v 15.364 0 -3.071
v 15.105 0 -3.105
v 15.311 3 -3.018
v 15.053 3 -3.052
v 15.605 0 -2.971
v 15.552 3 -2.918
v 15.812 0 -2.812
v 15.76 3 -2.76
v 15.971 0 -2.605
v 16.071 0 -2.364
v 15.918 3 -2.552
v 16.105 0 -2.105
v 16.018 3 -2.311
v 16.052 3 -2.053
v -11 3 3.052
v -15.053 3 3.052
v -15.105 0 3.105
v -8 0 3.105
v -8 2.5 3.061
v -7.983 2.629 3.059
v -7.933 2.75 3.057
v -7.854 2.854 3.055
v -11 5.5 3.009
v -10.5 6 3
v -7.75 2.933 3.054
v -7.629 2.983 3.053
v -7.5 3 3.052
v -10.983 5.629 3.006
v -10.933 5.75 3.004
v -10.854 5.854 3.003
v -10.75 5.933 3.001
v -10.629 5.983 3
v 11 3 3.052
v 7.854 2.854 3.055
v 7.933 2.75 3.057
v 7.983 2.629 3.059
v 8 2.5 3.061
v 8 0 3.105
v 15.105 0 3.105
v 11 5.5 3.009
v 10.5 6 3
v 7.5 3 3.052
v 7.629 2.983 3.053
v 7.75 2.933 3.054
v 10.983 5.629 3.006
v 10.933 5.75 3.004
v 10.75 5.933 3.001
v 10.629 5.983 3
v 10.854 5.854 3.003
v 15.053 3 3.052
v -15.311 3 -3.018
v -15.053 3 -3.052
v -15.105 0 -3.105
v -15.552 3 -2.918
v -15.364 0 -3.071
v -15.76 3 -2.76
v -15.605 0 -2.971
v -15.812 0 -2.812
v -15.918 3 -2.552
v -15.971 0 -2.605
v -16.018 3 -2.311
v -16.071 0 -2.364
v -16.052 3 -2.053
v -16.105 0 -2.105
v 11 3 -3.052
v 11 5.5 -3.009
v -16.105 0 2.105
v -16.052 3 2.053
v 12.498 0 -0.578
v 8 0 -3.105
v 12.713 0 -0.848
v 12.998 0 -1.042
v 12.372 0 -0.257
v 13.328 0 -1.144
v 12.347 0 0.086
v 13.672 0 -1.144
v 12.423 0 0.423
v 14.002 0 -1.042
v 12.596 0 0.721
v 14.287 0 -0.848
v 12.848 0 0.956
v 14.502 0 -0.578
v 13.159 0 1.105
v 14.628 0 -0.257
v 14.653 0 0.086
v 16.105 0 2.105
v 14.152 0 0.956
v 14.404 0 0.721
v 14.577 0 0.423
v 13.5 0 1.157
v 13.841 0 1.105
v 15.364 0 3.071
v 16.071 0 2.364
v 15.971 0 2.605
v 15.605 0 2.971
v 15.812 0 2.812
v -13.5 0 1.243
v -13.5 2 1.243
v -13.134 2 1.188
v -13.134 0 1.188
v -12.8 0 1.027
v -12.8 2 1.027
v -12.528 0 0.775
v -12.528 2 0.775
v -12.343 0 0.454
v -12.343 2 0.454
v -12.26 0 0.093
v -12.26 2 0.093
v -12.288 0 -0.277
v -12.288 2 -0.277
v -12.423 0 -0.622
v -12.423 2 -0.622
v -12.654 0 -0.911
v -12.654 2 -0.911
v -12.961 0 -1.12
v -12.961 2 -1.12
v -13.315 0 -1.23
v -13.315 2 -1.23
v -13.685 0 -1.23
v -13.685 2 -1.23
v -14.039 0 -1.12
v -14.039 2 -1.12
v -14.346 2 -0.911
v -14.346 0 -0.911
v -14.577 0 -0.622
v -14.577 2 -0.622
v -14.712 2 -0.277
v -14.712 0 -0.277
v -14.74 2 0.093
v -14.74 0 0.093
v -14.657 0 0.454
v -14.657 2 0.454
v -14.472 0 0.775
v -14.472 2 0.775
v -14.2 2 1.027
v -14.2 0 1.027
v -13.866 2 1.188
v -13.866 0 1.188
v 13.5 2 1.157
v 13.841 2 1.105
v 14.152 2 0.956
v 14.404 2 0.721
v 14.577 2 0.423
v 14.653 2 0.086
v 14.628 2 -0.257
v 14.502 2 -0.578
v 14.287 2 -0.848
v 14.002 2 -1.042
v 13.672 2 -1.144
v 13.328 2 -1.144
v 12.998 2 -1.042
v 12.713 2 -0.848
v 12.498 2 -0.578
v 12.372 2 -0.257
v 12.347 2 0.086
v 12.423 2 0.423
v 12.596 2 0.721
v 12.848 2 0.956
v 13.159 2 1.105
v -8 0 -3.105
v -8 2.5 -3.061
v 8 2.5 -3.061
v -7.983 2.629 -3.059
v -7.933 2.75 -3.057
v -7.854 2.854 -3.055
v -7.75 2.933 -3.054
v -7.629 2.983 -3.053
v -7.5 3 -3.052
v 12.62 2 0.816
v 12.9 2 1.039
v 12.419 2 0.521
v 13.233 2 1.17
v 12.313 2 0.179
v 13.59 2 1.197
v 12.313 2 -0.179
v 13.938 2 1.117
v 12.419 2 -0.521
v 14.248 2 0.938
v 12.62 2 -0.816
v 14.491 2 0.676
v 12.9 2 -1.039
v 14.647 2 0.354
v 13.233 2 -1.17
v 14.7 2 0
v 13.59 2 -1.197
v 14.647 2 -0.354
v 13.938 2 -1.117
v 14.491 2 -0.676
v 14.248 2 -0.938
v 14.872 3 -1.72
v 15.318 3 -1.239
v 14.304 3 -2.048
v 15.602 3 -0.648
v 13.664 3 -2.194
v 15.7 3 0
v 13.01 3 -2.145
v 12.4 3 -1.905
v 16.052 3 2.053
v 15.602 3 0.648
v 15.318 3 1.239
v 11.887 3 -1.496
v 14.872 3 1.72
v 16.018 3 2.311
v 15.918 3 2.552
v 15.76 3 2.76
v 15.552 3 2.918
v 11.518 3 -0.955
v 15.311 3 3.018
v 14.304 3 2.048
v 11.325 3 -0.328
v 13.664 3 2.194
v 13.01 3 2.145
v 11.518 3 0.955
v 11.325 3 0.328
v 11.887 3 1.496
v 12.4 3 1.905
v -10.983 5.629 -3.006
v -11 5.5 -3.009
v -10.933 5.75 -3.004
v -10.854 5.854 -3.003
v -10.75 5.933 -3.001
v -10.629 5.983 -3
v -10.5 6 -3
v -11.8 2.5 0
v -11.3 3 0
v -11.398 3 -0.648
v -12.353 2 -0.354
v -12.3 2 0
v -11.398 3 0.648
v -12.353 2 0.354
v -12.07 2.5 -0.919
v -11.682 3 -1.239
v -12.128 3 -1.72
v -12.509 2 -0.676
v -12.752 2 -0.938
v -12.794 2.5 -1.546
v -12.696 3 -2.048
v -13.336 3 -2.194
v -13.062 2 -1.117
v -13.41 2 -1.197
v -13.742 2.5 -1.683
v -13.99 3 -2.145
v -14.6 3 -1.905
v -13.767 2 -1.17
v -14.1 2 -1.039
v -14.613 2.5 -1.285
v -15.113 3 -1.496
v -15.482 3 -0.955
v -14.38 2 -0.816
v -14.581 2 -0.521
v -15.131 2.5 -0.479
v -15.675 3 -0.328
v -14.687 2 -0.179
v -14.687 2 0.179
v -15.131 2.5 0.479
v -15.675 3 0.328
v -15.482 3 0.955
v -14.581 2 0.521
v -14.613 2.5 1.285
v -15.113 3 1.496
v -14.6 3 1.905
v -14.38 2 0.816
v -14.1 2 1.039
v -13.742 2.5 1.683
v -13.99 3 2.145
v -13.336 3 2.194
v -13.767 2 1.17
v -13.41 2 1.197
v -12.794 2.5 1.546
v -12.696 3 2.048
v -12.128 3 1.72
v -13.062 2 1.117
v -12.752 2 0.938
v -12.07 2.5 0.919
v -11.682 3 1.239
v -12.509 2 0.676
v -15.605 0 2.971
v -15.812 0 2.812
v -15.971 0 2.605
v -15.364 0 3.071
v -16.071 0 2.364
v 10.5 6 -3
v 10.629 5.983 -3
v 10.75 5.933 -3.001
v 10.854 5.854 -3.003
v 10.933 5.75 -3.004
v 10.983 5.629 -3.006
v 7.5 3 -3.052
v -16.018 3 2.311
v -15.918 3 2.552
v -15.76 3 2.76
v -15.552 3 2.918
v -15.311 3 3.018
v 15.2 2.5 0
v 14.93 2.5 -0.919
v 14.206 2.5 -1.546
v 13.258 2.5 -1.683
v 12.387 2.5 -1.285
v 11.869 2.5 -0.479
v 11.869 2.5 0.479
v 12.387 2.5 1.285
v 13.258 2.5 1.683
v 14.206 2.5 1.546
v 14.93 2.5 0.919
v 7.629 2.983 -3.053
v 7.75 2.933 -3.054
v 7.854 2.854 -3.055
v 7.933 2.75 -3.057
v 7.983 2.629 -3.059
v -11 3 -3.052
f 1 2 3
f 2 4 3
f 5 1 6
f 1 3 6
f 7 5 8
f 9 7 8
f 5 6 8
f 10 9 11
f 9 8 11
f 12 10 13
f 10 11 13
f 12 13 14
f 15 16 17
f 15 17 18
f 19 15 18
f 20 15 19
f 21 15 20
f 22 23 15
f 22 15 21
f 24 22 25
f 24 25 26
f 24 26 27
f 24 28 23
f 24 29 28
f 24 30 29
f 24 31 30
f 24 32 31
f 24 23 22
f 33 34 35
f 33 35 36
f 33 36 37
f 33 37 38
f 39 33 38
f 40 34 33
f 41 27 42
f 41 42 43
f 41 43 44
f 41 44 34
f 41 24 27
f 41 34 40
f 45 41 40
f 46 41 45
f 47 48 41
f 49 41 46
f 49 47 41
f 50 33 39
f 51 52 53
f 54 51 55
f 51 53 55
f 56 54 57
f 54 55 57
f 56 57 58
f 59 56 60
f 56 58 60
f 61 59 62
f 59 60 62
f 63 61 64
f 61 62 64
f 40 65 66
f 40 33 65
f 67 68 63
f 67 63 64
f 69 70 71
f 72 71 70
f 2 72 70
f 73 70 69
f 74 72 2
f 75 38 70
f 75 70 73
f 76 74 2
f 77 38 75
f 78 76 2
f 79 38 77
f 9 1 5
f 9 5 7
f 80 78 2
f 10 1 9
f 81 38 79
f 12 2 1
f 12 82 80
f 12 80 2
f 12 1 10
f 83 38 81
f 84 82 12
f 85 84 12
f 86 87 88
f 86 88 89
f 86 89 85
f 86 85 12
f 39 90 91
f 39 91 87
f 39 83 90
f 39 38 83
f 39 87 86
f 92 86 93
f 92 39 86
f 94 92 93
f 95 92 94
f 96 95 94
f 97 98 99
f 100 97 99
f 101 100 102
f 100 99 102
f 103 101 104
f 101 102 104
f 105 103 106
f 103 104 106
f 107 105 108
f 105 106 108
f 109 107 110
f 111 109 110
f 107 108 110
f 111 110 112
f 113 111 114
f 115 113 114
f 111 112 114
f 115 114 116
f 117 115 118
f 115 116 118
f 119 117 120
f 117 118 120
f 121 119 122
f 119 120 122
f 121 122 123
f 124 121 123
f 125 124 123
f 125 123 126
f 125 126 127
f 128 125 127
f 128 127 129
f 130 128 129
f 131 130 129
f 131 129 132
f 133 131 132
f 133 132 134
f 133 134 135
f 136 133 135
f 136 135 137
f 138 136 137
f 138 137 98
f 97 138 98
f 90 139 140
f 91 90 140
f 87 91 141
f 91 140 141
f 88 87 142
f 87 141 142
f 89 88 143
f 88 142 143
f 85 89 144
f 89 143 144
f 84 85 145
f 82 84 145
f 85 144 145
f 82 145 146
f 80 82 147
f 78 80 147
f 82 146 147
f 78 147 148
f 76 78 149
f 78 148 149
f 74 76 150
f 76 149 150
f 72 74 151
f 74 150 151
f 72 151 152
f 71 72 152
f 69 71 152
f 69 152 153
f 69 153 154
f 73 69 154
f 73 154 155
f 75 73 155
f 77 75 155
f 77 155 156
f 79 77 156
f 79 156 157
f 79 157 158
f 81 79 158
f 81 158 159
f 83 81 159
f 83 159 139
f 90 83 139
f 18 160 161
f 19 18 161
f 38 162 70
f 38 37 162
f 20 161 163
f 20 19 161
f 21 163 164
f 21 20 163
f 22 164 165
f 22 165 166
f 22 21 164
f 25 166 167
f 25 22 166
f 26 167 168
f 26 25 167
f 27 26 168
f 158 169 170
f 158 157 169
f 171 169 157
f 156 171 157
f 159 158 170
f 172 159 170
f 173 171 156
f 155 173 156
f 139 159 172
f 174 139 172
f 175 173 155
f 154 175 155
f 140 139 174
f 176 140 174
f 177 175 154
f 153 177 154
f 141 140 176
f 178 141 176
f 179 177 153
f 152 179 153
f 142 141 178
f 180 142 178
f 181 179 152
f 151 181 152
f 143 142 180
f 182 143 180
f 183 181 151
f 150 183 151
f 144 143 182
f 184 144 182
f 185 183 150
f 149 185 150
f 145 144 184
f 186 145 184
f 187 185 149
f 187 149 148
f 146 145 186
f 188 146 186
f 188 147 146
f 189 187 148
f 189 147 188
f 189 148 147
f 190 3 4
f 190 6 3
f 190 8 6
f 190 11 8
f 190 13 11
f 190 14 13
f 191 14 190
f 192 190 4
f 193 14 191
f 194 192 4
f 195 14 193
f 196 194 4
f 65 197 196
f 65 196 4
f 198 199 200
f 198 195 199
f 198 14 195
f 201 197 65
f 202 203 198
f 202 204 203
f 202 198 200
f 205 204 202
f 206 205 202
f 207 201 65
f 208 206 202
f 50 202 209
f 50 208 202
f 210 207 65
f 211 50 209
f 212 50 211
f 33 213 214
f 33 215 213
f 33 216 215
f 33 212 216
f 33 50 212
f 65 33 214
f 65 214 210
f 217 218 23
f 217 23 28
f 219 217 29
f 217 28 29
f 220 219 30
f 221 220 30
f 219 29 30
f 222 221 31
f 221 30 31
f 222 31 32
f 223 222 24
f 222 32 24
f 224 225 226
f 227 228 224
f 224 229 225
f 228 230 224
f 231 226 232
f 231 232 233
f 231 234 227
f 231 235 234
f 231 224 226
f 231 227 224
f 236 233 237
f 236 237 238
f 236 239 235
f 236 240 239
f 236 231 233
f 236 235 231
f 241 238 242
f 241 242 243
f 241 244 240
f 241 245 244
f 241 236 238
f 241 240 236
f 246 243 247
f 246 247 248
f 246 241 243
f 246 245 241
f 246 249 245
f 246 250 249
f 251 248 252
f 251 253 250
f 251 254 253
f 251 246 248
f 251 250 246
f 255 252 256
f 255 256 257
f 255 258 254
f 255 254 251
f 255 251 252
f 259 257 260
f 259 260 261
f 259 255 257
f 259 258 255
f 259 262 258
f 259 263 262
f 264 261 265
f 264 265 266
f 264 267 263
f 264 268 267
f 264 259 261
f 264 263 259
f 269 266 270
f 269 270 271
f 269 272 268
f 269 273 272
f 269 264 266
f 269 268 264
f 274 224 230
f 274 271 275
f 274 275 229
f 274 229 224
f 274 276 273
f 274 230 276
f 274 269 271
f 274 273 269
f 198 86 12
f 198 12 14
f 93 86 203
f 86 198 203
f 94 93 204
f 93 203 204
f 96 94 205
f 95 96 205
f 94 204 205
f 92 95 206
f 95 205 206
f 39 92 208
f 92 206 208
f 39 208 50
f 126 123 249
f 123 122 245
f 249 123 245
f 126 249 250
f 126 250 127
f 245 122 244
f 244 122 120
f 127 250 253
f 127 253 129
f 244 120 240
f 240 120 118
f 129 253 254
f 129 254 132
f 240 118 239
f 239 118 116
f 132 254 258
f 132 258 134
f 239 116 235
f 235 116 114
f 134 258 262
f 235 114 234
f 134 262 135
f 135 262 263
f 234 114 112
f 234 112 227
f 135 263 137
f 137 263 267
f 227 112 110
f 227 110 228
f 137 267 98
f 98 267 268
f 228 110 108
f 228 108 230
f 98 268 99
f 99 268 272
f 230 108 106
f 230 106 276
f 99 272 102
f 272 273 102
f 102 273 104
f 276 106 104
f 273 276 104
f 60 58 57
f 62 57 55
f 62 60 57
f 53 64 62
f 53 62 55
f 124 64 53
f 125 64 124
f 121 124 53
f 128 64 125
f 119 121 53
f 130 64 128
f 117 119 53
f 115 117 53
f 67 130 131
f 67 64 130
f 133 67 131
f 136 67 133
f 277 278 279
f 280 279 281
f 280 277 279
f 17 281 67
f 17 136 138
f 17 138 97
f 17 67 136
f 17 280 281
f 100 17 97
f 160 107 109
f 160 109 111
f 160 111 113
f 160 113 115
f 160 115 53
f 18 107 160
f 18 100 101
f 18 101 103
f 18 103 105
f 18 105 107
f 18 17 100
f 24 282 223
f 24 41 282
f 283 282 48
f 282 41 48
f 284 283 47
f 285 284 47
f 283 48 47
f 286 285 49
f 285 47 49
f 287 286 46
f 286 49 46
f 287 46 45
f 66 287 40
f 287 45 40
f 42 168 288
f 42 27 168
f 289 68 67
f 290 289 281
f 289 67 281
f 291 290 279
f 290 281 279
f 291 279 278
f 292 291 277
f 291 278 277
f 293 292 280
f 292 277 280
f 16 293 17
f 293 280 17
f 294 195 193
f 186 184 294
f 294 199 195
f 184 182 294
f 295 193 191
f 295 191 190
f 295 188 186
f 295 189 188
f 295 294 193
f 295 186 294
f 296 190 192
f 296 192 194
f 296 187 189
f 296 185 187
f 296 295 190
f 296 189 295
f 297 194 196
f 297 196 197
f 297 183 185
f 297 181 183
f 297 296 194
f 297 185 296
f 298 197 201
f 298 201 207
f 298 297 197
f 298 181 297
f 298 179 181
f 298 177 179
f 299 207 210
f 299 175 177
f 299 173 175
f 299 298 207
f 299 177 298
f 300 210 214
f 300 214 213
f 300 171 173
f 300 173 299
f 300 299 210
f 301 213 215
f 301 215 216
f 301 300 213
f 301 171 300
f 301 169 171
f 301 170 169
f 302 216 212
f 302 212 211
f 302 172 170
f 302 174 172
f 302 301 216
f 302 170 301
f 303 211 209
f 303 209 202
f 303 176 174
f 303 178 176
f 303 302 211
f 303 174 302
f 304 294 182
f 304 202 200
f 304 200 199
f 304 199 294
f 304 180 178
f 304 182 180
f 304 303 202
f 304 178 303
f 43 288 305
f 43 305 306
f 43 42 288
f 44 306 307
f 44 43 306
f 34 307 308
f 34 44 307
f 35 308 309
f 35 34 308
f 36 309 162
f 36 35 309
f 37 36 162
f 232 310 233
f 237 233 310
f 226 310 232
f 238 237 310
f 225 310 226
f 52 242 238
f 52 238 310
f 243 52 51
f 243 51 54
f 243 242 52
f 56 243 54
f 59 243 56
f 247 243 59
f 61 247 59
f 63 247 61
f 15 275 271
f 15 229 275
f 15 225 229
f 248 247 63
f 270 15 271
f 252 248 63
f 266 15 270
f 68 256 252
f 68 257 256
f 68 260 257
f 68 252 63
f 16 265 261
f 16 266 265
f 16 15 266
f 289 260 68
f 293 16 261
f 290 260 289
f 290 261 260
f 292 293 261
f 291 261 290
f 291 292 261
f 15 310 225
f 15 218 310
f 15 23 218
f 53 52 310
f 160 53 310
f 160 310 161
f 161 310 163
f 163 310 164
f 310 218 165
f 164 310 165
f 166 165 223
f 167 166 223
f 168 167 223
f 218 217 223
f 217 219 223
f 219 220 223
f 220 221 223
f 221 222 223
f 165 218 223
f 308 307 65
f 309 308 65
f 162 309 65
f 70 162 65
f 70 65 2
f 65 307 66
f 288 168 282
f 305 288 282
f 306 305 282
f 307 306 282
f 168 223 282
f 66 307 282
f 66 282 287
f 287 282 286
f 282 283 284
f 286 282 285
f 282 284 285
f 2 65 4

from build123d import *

# Parameters (mm, degrees)
SALIENTE_EXTRUIR1_DEPTH      = 3
TALADROAVANZADO1_OUTLINE_R   = 1.2
TALADROAVANZADO1_DEPTH       = 1
TALADROAVANZADO1_DRAFT       = -45
TALADROAVANZADO1_2_OUTLINE_R = 1.2
TALADROAVANZADO1_2_DEPTH     = 1
TALADROAVANZADO1_2_DRAFT     = -45
CORTAR_EXTRUIR1_REACH        = 18.763
CROQUIS3_R                   = 1.243399974
CROQUIS3_R_2                 = 1.156671482
REDONDEO1_R                  = 0.5
REDONDEO2_R                  = 0.5
NGULO_DE_SALIDA1_ANGLE       = 1
REDONDEO3_R                  = 1


# Read off the part's stored shape, not the designer's step: TaladroAvanzado1
with BuildPart() as part:
    # Croquis1 → Saliente-Extruir1 (new, symmetric)
    with BuildSketch(Plane.XY):
        Polygon((-11, 0), (-8, 0), (-8, 3), (8, 3), (8, 0), (11, 0), (16, 0), (16, 3), (11, 3), (11, 6), (-11, 6), (-11, 3), (-16, 3), (-16, 0), align=None)
    extrude(amount=SALIENTE_EXTRUIR1_DEPTH, both=True)


with BuildPart() as taladroavanzado1_tool:
    # TaladroAvanzado1 outline → TaladroAvanzado1 (with draft: the straight prism first)
    with BuildSketch(Plane(origin=(0, 2, 0), x_dir=(1, 0, 0), z_dir=(0, 1, 0))):
        with Locations((13.5, 0)):
            Circle(TALADROAVANZADO1_OUTLINE_R)
    extrude(amount=TALADROAVANZADO1_DEPTH)
    # TaladroAvanzado1: the draft: its side faces are tilted about the plane it starts from
    taladroavanzado1_sides = [taladroavanzado1_tool.faces().sort_by_distance(p)[0] for p in [
        (12.3, 2.5, 0),
    ]]
    draft(taladroavanzado1_sides, Plane(origin=(0, 2, 0), x_dir=(1, 0, 0), z_dir=(0, 1, 0)), TALADROAVANZADO1_DRAFT)


with BuildPart() as part_1:
    add(part.part)

    # TaladroAvanzado1: cut by taladroavanzado1_tool
    add(taladroavanzado1_tool.part, mode=Mode.SUBTRACT)


with BuildPart() as taladroavanzado1_2_tool:
    # TaladroAvanzado1 2 outline → TaladroAvanzado1 2 (with draft: the straight prism first)
    with BuildSketch(Plane(origin=(0, 2, 0), x_dir=(1, 0, 0), z_dir=(0, 1, 0))):
        with Locations((-13.5, 0)):
            Circle(TALADROAVANZADO1_2_OUTLINE_R)
    extrude(amount=TALADROAVANZADO1_2_DEPTH)
    # TaladroAvanzado1 2: the draft: its side faces are tilted about the plane it starts from
    taladroavanzado1_2_sides = [taladroavanzado1_2_tool.faces().sort_by_distance(p)[0] for p in [
        (-14.7, 2.5, 0),
    ]]
    draft(taladroavanzado1_2_sides, Plane(origin=(0, 2, 0), x_dir=(1, 0, 0), z_dir=(0, 1, 0)), TALADROAVANZADO1_2_DRAFT)


with BuildPart() as part_2:
    add(part_1.part)

    # TaladroAvanzado1 2: cut by taladroavanzado1_2_tool
    add(taladroavanzado1_2_tool.part, mode=Mode.SUBTRACT)

    # Croquis3 → Cortar-Extruir1 (cut, up to next)
    with BuildSketch(Plane(origin=(0, 2, 0), x_dir=(1, 0, 0), z_dir=(0, 1, 0)), mode=Mode.PRIVATE) as cortar_extruir1_sk1:
        with Locations(Location((-13.5, 0, 0), (0, 0, 270))):
            Circle(CROQUIS3_R)
    cortar_extruir1_tool1 = extrude(cortar_extruir1_sk1.sketch, amount=-CORTAR_EXTRUIR1_REACH, mode=Mode.PRIVATE) & part_2.part
    # Croquis3 → Cortar-Extruir1 (cut, up to next)
    with BuildSketch(Plane(origin=(0, 2, 0), x_dir=(1, 0, 0), z_dir=(0, 1, 0)), mode=Mode.PRIVATE) as cortar_extruir1_sk2:
        with Locations(Location((13.5, 0, 0), (0, 0, 270))):
            Circle(CROQUIS3_R_2)
    cortar_extruir1_tool2 = extrude(cortar_extruir1_sk2.sketch, amount=-CORTAR_EXTRUIR1_REACH, mode=Mode.PRIVATE) & part_2.part
    add(cortar_extruir1_tool1.solids().sort_by_distance((-13.5, 2, 0))[0], mode=Mode.SUBTRACT)
    add(cortar_extruir1_tool2.solids().sort_by_distance((13.5, 2, 0))[0], mode=Mode.SUBTRACT)

    # Redondeo1
    redondeo1_edges = [part_2.edges().sort_by_distance(p)[0] for p in [
        (8, 3, 0),
        (-8, 3, 0),
    ]]
    fillet(redondeo1_edges, radius=REDONDEO1_R)

    # Redondeo2
    redondeo2_edges = [part_2.edges().sort_by_distance(p)[0] for p in [
        (-11, 6, 0),
        (11, 6, 0),
    ]]
    fillet(redondeo2_edges, radius=REDONDEO2_R)

    # Ángulo de salida1
    ngulo_de_salida1_faces = [part_2.faces().sort_by_distance(p)[0] for p in [
        (0, 3.234018397, 3),
        (0, 3.234018397, -3),
        (16, 1.5, 0),
        (-16, 1.5, 0),
    ]]
    draft(ngulo_de_salida1_faces, Plane(origin=(11, 6, 3), x_dir=(0, 0, 1), z_dir=(0, 1, 0)), NGULO_DE_SALIDA1_ANGLE)

    # Redondeo3
    redondeo3_edges = [part_2.edges().sort_by_distance(p)[0] for p in [
        (-16.078547792, 1.5, -3.078547792),
        (16.078547792, 1.5, -3.078547792),
        (16.078547792, 1.5, 3.078547792),
        (-16.078547792, 1.5, 3.078547792),
    ]]
    fillet(redondeo3_edges, radius=REDONDEO3_R)


solid = part_2.part
